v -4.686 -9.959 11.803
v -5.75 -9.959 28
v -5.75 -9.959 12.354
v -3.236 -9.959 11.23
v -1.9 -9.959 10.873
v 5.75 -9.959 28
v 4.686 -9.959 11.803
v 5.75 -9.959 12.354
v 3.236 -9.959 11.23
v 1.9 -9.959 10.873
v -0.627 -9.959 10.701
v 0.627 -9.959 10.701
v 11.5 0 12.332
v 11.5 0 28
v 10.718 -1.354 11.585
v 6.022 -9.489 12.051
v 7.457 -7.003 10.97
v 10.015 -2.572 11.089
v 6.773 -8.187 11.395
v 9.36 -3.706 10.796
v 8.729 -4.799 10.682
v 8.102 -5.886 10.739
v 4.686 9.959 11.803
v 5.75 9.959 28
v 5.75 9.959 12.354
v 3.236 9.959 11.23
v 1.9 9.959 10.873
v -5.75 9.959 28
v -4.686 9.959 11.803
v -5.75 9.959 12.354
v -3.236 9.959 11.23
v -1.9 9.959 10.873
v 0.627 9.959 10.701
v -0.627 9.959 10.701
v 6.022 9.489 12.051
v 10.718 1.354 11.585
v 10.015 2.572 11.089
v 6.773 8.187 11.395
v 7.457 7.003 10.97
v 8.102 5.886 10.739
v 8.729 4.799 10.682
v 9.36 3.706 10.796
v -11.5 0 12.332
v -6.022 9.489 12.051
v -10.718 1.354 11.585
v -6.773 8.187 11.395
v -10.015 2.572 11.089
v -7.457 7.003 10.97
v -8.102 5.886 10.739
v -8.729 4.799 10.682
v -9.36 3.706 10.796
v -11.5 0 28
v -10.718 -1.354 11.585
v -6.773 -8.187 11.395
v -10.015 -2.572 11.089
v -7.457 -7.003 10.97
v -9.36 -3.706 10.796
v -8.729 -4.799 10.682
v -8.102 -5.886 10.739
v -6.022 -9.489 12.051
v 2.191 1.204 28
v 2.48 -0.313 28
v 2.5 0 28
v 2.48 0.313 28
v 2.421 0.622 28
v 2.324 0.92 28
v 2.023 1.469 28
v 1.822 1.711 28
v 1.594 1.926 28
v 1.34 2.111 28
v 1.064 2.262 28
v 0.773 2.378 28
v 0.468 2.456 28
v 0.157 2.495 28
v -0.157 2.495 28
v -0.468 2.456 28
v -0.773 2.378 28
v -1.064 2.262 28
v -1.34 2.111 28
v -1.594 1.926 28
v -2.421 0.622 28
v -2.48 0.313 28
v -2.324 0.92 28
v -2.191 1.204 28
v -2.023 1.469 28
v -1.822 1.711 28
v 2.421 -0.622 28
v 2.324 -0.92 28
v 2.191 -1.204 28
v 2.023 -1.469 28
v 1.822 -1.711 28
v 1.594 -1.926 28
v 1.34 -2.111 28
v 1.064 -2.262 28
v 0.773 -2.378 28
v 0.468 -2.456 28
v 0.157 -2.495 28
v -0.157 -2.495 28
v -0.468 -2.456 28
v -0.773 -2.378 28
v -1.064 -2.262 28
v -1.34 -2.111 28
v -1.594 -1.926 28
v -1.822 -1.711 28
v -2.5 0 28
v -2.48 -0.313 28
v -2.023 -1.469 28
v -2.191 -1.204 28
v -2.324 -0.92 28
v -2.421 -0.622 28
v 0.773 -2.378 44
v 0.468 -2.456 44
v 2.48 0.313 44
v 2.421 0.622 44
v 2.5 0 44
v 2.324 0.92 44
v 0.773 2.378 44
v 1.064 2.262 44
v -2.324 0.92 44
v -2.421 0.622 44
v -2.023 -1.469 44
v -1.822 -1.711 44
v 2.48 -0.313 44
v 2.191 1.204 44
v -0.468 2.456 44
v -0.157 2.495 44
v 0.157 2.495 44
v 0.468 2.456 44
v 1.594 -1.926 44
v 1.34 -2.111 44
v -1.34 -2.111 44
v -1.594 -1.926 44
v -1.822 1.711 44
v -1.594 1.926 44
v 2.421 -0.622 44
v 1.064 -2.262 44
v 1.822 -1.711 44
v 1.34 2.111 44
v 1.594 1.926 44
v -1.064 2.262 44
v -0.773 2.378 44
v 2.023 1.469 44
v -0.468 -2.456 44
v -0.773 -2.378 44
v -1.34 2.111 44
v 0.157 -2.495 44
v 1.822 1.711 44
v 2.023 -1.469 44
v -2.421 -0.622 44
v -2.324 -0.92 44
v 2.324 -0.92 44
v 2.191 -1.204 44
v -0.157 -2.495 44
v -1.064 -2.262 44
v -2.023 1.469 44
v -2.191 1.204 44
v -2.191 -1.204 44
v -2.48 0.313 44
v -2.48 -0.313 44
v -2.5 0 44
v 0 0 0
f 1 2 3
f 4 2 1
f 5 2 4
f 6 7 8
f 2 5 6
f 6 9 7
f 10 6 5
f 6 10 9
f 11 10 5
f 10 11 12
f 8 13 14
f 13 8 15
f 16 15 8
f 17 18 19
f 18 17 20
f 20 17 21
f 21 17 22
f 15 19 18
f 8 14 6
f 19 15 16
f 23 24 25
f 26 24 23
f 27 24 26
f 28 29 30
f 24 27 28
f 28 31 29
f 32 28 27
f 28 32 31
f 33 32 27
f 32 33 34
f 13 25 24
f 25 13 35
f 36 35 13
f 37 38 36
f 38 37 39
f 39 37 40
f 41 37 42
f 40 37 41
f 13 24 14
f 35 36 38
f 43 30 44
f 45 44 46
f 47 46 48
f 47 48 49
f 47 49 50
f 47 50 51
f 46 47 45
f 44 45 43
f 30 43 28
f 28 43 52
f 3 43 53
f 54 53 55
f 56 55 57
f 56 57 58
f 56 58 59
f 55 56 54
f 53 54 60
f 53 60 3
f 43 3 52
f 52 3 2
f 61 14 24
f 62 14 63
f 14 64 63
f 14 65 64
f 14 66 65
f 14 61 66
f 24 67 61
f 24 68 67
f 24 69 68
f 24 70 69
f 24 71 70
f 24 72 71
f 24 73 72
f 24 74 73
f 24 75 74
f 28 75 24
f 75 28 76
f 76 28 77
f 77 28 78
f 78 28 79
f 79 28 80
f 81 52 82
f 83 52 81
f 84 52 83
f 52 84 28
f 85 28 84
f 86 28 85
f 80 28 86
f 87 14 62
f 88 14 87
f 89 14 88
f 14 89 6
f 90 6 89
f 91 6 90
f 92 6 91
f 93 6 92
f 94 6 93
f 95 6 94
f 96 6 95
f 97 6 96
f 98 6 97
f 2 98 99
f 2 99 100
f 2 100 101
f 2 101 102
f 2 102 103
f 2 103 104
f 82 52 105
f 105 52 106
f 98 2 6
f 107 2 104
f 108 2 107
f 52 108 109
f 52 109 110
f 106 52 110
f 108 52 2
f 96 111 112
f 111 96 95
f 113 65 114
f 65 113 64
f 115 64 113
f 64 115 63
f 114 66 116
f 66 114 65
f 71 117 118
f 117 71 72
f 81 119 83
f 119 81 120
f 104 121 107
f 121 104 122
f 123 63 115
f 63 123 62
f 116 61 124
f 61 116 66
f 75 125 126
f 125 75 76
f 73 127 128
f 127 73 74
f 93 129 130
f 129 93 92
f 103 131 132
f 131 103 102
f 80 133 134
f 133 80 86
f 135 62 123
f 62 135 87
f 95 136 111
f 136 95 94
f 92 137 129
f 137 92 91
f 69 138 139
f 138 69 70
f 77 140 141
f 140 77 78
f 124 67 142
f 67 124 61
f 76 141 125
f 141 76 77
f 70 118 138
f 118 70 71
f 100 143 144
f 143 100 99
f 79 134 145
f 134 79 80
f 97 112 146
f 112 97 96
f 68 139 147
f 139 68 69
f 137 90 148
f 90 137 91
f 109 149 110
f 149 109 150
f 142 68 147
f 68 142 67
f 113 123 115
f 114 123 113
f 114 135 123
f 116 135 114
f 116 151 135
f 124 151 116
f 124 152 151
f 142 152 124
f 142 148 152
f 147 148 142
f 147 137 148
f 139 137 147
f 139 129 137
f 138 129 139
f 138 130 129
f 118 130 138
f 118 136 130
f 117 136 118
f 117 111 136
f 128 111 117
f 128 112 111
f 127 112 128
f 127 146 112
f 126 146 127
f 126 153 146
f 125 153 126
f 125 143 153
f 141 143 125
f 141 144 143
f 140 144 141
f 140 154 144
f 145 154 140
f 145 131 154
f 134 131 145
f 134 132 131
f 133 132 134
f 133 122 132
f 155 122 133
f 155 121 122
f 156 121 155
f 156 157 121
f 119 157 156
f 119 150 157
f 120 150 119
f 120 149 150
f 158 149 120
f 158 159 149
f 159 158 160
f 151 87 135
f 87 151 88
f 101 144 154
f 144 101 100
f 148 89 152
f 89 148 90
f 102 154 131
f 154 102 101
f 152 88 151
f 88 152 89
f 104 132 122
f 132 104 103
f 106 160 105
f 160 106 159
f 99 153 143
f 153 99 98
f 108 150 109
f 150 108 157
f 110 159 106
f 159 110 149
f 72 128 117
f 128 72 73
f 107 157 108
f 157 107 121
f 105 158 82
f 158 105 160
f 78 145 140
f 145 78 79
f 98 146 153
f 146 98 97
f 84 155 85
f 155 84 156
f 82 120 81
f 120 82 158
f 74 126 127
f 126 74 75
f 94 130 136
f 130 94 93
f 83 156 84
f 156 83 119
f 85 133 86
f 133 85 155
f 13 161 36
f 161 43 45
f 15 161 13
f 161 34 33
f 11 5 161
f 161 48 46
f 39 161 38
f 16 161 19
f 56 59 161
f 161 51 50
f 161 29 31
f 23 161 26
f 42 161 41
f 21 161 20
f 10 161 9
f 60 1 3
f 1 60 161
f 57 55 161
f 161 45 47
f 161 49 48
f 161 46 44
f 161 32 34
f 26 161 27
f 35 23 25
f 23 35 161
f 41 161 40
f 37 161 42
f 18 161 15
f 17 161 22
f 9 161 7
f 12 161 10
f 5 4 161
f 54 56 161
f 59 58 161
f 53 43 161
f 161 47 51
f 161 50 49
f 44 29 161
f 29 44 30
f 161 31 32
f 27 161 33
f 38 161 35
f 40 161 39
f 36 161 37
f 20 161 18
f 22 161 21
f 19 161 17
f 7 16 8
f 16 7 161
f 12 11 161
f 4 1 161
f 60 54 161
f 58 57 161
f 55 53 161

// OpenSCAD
// Esimerkki 2a: Pirra

// Kokonaisleveys ja -korkeus
pirra_h = 44;
pirra_d = 23;

// Kärkikulma
tip_angle = 43;

// Kahvan korkeus ja halkaisija
handle_h = 16;
handle_d = 5;

intersection() {
  union() {
    cylinder(h=pirra_h-handle_h, d=pirra_d, $fn=6);
    translate([0, 0, pirra_h-handle_h]) {
      cylinder(h=handle_h, d=handle_d, $fn=50);
    }
  }
  cylinder(h=pirra_h, r1=0, r2=tan(tip_angle)*pirra_h, $fn=50);
}
